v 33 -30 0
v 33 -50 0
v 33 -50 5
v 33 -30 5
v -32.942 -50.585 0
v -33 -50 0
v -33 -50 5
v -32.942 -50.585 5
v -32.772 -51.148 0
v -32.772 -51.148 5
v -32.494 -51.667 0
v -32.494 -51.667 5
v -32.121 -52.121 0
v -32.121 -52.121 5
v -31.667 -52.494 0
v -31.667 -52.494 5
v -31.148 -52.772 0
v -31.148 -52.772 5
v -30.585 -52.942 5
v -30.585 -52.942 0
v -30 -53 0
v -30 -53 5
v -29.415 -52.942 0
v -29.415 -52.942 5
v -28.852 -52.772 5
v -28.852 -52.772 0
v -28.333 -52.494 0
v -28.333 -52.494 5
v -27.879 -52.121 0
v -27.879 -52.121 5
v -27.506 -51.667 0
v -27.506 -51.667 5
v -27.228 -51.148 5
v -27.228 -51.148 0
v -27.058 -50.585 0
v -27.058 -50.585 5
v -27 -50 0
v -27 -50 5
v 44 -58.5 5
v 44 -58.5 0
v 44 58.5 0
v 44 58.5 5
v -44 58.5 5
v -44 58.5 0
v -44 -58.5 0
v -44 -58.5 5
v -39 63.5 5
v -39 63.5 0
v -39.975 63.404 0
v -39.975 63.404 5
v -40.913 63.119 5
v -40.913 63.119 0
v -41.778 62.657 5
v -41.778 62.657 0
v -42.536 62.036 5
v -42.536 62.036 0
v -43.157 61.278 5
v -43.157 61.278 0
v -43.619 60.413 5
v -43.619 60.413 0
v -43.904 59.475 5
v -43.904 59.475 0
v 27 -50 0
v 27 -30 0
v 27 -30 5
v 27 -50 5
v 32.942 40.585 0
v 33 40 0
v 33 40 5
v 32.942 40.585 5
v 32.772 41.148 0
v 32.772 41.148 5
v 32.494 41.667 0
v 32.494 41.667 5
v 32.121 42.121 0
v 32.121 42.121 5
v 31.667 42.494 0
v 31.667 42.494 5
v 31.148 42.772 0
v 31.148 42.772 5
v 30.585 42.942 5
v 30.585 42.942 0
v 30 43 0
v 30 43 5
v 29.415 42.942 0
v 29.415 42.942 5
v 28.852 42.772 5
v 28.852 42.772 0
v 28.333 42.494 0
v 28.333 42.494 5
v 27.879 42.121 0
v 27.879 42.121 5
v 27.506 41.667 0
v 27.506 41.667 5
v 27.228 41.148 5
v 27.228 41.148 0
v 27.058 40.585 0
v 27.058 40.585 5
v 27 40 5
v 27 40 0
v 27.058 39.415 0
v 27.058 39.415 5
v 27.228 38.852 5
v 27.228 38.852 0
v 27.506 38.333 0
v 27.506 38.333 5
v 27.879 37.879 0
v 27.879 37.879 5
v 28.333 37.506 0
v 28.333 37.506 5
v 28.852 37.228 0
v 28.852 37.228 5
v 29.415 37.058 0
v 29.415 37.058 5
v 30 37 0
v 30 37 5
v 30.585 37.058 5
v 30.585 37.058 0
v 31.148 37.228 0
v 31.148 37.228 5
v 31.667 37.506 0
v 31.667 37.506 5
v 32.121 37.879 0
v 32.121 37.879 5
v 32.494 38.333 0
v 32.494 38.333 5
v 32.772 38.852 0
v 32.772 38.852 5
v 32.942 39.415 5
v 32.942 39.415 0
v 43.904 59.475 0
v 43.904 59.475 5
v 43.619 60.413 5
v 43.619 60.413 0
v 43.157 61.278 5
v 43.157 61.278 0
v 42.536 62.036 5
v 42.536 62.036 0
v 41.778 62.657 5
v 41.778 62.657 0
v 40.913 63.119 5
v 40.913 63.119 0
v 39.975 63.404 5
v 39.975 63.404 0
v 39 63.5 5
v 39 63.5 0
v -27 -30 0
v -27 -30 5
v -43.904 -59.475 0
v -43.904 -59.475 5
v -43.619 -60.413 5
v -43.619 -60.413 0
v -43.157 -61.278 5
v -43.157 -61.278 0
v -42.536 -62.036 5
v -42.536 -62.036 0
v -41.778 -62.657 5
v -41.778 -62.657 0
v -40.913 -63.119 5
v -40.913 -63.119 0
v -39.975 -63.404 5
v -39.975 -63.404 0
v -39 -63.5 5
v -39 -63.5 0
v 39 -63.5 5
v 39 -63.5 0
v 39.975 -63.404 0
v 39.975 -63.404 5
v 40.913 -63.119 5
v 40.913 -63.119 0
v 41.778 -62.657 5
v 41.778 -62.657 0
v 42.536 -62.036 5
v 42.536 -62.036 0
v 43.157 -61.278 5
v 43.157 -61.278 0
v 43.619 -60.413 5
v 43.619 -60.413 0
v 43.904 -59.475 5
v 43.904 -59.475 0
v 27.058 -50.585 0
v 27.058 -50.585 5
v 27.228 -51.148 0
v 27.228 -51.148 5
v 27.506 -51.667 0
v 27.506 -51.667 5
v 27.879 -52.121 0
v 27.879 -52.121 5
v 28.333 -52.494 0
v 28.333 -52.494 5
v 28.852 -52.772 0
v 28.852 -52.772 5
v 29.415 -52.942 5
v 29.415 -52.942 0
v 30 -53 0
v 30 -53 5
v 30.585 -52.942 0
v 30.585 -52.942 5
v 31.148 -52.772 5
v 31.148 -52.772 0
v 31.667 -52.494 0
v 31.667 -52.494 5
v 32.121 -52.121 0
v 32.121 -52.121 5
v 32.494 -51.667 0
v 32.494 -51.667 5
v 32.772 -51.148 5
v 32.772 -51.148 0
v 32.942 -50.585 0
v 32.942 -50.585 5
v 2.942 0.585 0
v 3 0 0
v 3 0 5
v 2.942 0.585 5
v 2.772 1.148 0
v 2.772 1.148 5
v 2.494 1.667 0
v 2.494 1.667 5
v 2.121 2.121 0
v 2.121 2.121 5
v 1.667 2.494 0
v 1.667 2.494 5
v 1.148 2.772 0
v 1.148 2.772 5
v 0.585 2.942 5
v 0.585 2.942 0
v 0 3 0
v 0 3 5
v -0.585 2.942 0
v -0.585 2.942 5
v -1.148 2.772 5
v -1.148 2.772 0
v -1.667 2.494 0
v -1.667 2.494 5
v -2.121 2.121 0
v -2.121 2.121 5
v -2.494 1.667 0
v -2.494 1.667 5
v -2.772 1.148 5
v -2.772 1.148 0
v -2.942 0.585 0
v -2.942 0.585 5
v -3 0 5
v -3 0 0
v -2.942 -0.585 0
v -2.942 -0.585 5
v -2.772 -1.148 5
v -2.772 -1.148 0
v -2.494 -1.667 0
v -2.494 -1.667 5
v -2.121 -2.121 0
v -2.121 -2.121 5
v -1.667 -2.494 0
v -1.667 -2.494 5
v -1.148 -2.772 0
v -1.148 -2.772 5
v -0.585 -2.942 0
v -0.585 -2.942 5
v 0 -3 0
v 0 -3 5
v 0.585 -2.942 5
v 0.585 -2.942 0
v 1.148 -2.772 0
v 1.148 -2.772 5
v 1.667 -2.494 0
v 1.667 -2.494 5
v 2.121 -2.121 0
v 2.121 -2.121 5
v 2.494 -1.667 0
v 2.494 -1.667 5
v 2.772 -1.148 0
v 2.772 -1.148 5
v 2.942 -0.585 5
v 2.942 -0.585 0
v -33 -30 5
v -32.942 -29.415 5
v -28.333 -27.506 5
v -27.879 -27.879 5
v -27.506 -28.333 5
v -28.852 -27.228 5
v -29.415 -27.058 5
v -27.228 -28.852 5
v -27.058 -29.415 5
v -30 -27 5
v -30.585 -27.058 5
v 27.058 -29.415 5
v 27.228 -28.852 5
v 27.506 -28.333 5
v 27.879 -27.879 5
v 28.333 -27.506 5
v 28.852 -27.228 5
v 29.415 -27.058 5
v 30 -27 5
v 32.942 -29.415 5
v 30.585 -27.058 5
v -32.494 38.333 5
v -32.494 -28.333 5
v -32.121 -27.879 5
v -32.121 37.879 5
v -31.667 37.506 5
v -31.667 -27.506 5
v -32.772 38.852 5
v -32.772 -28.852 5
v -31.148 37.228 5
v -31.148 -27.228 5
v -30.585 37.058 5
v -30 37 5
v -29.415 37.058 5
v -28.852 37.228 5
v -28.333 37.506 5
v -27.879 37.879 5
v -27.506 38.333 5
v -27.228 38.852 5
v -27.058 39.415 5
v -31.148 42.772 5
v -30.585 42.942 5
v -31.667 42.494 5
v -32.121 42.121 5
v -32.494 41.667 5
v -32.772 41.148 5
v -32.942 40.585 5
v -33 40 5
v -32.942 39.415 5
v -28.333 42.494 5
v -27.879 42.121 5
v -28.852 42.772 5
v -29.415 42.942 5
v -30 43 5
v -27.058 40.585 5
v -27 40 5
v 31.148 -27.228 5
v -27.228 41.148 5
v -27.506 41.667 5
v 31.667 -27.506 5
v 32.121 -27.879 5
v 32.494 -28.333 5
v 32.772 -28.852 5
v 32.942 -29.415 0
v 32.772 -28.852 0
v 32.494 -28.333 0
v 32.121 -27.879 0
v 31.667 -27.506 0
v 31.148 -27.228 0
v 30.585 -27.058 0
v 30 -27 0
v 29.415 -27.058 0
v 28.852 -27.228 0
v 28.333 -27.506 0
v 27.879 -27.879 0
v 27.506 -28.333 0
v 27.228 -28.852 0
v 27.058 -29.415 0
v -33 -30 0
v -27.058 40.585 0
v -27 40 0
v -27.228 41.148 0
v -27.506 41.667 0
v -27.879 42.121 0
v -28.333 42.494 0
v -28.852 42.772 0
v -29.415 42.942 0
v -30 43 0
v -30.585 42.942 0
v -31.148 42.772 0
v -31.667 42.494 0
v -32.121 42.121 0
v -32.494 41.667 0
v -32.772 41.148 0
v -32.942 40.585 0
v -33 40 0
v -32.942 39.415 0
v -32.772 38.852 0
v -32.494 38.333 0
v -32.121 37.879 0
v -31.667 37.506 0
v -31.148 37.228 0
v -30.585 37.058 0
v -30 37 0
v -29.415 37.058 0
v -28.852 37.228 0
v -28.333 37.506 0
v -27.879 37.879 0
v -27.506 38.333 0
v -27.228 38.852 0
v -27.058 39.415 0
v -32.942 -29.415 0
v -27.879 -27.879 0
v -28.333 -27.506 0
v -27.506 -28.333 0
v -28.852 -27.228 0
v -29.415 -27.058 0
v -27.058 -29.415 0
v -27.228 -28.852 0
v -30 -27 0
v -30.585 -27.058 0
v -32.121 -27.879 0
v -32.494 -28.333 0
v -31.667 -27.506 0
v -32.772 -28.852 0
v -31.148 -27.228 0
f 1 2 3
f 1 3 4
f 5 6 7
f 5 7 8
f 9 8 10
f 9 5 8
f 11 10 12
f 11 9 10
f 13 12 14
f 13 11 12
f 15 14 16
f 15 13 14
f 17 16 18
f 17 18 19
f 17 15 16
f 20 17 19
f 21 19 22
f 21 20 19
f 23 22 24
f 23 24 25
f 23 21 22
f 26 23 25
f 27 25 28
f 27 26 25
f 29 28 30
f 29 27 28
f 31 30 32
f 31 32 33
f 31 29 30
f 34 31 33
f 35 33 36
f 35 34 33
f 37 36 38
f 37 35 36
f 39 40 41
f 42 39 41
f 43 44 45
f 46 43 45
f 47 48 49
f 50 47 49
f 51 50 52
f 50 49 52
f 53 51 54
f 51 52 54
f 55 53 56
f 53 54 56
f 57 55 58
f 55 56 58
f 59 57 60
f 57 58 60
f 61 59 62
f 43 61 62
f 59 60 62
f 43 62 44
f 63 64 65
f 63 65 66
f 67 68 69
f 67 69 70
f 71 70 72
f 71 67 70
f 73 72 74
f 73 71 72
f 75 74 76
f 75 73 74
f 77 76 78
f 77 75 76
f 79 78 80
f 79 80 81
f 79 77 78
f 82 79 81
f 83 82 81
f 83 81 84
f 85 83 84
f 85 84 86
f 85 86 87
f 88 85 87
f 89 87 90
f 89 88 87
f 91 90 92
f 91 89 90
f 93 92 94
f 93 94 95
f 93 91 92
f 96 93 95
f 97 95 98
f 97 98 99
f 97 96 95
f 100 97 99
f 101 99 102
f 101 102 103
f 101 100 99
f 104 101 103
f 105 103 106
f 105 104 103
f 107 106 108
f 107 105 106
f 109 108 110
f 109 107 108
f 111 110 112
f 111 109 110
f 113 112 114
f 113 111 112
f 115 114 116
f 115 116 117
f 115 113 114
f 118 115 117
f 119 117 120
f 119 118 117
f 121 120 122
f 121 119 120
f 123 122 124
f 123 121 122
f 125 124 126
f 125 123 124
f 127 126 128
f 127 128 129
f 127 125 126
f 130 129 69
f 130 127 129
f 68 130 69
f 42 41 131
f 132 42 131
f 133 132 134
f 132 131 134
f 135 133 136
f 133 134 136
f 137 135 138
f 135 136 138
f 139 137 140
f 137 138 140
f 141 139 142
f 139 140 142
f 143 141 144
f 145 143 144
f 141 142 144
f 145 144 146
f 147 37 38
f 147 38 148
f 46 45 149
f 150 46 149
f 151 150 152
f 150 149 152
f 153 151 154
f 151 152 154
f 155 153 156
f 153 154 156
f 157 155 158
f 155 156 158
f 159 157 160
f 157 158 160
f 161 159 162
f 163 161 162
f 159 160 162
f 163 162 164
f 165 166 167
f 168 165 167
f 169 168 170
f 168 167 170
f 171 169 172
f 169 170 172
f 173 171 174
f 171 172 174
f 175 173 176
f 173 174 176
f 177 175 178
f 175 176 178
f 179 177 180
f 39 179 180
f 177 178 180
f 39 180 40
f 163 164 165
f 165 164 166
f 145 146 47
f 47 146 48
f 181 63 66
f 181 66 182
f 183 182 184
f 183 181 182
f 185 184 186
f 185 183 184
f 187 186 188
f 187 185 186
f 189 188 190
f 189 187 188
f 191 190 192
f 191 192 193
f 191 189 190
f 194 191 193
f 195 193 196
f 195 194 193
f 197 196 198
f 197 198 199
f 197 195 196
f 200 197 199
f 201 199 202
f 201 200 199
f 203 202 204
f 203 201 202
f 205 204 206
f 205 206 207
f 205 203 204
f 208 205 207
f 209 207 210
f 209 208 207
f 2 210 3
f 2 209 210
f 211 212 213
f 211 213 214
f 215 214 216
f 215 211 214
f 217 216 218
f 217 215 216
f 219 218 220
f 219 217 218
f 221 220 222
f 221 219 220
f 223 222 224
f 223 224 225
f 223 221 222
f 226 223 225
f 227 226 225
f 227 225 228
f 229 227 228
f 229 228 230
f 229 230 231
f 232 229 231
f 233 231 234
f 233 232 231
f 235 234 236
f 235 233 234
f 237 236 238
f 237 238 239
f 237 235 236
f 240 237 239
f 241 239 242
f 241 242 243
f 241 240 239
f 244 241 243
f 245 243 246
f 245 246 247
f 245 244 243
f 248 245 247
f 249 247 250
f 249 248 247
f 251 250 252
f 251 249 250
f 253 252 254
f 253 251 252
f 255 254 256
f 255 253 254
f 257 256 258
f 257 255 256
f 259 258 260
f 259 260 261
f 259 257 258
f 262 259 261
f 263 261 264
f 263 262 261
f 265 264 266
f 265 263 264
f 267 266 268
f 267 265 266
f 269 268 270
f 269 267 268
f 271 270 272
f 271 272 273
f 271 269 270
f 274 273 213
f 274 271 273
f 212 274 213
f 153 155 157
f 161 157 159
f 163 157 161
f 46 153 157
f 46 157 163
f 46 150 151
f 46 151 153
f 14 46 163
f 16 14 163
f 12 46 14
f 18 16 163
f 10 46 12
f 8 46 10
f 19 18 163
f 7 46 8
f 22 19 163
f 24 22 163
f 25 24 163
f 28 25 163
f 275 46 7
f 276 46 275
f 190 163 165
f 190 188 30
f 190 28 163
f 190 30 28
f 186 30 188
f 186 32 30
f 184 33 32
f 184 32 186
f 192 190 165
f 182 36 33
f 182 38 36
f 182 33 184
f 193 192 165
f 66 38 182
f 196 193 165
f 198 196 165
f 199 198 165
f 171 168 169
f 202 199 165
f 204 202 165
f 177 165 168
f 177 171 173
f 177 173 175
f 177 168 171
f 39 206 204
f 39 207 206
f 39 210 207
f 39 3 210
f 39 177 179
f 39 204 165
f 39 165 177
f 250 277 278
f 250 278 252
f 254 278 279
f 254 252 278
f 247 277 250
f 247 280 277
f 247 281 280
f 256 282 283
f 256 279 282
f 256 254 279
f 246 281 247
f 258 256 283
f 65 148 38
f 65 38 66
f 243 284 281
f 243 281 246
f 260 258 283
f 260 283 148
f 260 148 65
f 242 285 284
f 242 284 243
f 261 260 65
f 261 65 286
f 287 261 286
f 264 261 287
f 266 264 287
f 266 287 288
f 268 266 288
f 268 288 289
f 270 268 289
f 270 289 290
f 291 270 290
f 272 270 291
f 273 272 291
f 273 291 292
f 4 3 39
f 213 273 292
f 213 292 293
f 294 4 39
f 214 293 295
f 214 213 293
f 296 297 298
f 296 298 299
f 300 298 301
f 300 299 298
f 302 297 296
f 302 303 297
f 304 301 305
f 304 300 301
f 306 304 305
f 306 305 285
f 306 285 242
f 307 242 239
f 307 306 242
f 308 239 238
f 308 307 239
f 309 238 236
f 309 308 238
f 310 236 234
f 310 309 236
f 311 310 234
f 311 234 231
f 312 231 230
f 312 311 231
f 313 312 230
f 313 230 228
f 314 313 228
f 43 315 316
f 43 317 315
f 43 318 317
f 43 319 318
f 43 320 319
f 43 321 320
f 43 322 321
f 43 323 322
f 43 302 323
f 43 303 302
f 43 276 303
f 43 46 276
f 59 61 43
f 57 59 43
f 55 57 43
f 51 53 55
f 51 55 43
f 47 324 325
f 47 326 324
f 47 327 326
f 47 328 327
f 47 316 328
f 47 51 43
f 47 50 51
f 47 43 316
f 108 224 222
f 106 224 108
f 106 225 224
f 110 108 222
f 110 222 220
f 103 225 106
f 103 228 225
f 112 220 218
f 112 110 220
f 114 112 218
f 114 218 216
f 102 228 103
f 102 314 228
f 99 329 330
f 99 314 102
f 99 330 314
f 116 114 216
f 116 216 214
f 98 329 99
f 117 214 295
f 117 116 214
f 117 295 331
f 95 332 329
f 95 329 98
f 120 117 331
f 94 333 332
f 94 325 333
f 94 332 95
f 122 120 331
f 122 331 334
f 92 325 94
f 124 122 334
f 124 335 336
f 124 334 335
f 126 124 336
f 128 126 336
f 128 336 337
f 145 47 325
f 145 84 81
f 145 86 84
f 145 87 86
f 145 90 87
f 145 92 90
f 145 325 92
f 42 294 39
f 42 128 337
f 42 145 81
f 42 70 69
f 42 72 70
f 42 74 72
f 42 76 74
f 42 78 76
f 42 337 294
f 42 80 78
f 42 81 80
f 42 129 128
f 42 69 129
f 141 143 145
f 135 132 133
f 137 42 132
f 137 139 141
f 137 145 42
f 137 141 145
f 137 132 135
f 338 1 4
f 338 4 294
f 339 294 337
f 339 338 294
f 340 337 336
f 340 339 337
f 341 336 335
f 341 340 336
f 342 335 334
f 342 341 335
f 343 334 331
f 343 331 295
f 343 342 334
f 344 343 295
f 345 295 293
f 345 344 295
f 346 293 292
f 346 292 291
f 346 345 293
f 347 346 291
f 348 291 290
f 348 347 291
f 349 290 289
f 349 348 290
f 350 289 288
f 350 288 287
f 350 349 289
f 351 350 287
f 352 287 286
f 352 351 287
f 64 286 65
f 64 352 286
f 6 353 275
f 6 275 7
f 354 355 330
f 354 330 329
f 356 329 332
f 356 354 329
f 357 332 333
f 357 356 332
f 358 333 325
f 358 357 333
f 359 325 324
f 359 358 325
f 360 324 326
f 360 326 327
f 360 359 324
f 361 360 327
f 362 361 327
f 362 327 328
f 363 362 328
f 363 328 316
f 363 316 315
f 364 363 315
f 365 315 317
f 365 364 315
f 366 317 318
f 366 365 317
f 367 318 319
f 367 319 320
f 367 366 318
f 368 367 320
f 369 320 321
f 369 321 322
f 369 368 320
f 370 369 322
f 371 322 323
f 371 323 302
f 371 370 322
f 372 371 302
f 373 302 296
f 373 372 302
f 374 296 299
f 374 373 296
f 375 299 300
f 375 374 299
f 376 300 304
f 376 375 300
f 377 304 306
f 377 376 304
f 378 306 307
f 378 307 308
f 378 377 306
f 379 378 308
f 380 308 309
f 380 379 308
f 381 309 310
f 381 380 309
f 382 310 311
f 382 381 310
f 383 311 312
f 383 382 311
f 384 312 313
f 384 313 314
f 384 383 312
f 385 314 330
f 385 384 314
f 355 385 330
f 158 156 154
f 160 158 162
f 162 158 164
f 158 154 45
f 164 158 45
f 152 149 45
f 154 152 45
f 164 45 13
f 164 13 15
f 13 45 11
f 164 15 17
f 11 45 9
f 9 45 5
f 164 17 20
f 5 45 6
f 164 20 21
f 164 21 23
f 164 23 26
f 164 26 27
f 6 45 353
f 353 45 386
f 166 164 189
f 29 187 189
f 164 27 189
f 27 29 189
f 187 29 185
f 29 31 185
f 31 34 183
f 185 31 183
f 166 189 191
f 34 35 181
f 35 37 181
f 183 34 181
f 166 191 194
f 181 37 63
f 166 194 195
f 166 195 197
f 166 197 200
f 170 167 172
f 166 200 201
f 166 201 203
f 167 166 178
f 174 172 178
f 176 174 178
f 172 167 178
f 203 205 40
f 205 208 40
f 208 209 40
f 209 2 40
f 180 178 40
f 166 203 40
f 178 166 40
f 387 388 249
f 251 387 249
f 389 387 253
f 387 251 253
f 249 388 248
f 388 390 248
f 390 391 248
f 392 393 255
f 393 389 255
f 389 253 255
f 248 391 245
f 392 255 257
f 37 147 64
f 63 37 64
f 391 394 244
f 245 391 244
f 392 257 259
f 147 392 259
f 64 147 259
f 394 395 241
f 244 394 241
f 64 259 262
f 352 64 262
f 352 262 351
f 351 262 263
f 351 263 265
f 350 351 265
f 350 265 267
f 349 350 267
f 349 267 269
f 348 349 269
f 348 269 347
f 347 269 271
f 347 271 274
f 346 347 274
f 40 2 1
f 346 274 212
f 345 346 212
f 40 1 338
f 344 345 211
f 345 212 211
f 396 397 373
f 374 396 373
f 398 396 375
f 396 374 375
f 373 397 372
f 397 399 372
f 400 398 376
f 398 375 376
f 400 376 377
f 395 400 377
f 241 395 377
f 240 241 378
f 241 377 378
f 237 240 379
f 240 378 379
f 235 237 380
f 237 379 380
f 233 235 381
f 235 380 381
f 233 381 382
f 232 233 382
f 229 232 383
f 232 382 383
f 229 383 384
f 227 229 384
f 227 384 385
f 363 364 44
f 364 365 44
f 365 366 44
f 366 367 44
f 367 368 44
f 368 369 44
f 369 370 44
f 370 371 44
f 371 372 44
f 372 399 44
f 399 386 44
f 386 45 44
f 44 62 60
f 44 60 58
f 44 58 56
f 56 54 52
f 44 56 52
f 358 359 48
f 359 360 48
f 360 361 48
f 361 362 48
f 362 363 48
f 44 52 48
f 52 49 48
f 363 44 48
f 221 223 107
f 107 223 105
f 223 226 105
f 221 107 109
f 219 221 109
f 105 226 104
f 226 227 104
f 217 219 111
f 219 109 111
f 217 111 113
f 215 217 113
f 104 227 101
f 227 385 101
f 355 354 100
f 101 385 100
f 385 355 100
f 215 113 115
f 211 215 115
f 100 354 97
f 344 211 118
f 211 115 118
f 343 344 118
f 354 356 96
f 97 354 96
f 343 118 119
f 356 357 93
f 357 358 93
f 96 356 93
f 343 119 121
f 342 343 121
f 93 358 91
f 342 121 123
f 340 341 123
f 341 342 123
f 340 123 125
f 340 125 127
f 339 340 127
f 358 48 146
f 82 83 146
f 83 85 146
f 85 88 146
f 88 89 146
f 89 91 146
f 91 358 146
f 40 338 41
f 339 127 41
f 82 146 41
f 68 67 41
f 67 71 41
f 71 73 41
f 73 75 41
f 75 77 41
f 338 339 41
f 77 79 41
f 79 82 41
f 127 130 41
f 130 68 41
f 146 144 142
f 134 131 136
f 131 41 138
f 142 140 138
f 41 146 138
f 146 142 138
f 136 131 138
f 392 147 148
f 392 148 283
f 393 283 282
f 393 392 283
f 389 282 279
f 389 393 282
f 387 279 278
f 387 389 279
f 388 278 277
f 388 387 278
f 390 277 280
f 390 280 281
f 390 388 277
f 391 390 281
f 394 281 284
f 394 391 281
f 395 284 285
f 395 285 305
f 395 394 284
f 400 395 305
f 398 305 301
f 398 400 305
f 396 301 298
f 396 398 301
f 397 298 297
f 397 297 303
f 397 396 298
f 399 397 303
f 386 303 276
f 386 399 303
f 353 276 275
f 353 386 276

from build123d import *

# Parameters (mm, degrees)
SKETCH1_R           = 3
BOSS_EXTRUDE1_DEPTH = 5


with BuildPart() as part:
    # Sketch1 → Boss-Extrude1 (new body)
    with BuildSketch(Plane.XY):
        with BuildLine():
            Line((-39, -63.5), (39, -63.5))
            ThreePointArc((39, -63.5), (42.535533906, -62.035533906), (44, -58.5))
            Line((44, -58.5), (44, 58.5))
            ThreePointArc((44, 58.5), (42.535533906, 62.035533906), (39, 63.5))
            Line((39, 63.5), (-39, 63.5))
            ThreePointArc((-39, 63.5), (-42.535533906, 62.035533906), (-44, 58.5))
            Line((-44, 58.5), (-44, -58.5))
            ThreePointArc((-44, -58.5), (-42.535533906, -62.035533906), (-39, -63.5))
        make_face()
        with Locations((-30, 40)):
            Circle(SKETCH1_R, mode=Mode.SUBTRACT)
        with Locations((30, 40)):
            Circle(SKETCH1_R, mode=Mode.SUBTRACT)
        Circle(SKETCH1_R, mode=Mode.SUBTRACT)
        with BuildLine():
            Line((27, -30), (27, -50))
            ThreePointArc((27, -50), (30, -53), (33, -50))
            Line((33, -50), (33, -30))
            ThreePointArc((33, -30), (30, -27), (27, -30))
        make_face(mode=Mode.SUBTRACT)
        with BuildLine():
            Line((-33, -30), (-33, -50))
            ThreePointArc((-33, -50), (-30, -53), (-27, -50))
            Line((-27, -50), (-27, -30))
            ThreePointArc((-27, -30), (-30, -27), (-33, -30))
        make_face(mode=Mode.SUBTRACT)
    extrude(amount=BOSS_EXTRUDE1_DEPTH)


solid = part.part
